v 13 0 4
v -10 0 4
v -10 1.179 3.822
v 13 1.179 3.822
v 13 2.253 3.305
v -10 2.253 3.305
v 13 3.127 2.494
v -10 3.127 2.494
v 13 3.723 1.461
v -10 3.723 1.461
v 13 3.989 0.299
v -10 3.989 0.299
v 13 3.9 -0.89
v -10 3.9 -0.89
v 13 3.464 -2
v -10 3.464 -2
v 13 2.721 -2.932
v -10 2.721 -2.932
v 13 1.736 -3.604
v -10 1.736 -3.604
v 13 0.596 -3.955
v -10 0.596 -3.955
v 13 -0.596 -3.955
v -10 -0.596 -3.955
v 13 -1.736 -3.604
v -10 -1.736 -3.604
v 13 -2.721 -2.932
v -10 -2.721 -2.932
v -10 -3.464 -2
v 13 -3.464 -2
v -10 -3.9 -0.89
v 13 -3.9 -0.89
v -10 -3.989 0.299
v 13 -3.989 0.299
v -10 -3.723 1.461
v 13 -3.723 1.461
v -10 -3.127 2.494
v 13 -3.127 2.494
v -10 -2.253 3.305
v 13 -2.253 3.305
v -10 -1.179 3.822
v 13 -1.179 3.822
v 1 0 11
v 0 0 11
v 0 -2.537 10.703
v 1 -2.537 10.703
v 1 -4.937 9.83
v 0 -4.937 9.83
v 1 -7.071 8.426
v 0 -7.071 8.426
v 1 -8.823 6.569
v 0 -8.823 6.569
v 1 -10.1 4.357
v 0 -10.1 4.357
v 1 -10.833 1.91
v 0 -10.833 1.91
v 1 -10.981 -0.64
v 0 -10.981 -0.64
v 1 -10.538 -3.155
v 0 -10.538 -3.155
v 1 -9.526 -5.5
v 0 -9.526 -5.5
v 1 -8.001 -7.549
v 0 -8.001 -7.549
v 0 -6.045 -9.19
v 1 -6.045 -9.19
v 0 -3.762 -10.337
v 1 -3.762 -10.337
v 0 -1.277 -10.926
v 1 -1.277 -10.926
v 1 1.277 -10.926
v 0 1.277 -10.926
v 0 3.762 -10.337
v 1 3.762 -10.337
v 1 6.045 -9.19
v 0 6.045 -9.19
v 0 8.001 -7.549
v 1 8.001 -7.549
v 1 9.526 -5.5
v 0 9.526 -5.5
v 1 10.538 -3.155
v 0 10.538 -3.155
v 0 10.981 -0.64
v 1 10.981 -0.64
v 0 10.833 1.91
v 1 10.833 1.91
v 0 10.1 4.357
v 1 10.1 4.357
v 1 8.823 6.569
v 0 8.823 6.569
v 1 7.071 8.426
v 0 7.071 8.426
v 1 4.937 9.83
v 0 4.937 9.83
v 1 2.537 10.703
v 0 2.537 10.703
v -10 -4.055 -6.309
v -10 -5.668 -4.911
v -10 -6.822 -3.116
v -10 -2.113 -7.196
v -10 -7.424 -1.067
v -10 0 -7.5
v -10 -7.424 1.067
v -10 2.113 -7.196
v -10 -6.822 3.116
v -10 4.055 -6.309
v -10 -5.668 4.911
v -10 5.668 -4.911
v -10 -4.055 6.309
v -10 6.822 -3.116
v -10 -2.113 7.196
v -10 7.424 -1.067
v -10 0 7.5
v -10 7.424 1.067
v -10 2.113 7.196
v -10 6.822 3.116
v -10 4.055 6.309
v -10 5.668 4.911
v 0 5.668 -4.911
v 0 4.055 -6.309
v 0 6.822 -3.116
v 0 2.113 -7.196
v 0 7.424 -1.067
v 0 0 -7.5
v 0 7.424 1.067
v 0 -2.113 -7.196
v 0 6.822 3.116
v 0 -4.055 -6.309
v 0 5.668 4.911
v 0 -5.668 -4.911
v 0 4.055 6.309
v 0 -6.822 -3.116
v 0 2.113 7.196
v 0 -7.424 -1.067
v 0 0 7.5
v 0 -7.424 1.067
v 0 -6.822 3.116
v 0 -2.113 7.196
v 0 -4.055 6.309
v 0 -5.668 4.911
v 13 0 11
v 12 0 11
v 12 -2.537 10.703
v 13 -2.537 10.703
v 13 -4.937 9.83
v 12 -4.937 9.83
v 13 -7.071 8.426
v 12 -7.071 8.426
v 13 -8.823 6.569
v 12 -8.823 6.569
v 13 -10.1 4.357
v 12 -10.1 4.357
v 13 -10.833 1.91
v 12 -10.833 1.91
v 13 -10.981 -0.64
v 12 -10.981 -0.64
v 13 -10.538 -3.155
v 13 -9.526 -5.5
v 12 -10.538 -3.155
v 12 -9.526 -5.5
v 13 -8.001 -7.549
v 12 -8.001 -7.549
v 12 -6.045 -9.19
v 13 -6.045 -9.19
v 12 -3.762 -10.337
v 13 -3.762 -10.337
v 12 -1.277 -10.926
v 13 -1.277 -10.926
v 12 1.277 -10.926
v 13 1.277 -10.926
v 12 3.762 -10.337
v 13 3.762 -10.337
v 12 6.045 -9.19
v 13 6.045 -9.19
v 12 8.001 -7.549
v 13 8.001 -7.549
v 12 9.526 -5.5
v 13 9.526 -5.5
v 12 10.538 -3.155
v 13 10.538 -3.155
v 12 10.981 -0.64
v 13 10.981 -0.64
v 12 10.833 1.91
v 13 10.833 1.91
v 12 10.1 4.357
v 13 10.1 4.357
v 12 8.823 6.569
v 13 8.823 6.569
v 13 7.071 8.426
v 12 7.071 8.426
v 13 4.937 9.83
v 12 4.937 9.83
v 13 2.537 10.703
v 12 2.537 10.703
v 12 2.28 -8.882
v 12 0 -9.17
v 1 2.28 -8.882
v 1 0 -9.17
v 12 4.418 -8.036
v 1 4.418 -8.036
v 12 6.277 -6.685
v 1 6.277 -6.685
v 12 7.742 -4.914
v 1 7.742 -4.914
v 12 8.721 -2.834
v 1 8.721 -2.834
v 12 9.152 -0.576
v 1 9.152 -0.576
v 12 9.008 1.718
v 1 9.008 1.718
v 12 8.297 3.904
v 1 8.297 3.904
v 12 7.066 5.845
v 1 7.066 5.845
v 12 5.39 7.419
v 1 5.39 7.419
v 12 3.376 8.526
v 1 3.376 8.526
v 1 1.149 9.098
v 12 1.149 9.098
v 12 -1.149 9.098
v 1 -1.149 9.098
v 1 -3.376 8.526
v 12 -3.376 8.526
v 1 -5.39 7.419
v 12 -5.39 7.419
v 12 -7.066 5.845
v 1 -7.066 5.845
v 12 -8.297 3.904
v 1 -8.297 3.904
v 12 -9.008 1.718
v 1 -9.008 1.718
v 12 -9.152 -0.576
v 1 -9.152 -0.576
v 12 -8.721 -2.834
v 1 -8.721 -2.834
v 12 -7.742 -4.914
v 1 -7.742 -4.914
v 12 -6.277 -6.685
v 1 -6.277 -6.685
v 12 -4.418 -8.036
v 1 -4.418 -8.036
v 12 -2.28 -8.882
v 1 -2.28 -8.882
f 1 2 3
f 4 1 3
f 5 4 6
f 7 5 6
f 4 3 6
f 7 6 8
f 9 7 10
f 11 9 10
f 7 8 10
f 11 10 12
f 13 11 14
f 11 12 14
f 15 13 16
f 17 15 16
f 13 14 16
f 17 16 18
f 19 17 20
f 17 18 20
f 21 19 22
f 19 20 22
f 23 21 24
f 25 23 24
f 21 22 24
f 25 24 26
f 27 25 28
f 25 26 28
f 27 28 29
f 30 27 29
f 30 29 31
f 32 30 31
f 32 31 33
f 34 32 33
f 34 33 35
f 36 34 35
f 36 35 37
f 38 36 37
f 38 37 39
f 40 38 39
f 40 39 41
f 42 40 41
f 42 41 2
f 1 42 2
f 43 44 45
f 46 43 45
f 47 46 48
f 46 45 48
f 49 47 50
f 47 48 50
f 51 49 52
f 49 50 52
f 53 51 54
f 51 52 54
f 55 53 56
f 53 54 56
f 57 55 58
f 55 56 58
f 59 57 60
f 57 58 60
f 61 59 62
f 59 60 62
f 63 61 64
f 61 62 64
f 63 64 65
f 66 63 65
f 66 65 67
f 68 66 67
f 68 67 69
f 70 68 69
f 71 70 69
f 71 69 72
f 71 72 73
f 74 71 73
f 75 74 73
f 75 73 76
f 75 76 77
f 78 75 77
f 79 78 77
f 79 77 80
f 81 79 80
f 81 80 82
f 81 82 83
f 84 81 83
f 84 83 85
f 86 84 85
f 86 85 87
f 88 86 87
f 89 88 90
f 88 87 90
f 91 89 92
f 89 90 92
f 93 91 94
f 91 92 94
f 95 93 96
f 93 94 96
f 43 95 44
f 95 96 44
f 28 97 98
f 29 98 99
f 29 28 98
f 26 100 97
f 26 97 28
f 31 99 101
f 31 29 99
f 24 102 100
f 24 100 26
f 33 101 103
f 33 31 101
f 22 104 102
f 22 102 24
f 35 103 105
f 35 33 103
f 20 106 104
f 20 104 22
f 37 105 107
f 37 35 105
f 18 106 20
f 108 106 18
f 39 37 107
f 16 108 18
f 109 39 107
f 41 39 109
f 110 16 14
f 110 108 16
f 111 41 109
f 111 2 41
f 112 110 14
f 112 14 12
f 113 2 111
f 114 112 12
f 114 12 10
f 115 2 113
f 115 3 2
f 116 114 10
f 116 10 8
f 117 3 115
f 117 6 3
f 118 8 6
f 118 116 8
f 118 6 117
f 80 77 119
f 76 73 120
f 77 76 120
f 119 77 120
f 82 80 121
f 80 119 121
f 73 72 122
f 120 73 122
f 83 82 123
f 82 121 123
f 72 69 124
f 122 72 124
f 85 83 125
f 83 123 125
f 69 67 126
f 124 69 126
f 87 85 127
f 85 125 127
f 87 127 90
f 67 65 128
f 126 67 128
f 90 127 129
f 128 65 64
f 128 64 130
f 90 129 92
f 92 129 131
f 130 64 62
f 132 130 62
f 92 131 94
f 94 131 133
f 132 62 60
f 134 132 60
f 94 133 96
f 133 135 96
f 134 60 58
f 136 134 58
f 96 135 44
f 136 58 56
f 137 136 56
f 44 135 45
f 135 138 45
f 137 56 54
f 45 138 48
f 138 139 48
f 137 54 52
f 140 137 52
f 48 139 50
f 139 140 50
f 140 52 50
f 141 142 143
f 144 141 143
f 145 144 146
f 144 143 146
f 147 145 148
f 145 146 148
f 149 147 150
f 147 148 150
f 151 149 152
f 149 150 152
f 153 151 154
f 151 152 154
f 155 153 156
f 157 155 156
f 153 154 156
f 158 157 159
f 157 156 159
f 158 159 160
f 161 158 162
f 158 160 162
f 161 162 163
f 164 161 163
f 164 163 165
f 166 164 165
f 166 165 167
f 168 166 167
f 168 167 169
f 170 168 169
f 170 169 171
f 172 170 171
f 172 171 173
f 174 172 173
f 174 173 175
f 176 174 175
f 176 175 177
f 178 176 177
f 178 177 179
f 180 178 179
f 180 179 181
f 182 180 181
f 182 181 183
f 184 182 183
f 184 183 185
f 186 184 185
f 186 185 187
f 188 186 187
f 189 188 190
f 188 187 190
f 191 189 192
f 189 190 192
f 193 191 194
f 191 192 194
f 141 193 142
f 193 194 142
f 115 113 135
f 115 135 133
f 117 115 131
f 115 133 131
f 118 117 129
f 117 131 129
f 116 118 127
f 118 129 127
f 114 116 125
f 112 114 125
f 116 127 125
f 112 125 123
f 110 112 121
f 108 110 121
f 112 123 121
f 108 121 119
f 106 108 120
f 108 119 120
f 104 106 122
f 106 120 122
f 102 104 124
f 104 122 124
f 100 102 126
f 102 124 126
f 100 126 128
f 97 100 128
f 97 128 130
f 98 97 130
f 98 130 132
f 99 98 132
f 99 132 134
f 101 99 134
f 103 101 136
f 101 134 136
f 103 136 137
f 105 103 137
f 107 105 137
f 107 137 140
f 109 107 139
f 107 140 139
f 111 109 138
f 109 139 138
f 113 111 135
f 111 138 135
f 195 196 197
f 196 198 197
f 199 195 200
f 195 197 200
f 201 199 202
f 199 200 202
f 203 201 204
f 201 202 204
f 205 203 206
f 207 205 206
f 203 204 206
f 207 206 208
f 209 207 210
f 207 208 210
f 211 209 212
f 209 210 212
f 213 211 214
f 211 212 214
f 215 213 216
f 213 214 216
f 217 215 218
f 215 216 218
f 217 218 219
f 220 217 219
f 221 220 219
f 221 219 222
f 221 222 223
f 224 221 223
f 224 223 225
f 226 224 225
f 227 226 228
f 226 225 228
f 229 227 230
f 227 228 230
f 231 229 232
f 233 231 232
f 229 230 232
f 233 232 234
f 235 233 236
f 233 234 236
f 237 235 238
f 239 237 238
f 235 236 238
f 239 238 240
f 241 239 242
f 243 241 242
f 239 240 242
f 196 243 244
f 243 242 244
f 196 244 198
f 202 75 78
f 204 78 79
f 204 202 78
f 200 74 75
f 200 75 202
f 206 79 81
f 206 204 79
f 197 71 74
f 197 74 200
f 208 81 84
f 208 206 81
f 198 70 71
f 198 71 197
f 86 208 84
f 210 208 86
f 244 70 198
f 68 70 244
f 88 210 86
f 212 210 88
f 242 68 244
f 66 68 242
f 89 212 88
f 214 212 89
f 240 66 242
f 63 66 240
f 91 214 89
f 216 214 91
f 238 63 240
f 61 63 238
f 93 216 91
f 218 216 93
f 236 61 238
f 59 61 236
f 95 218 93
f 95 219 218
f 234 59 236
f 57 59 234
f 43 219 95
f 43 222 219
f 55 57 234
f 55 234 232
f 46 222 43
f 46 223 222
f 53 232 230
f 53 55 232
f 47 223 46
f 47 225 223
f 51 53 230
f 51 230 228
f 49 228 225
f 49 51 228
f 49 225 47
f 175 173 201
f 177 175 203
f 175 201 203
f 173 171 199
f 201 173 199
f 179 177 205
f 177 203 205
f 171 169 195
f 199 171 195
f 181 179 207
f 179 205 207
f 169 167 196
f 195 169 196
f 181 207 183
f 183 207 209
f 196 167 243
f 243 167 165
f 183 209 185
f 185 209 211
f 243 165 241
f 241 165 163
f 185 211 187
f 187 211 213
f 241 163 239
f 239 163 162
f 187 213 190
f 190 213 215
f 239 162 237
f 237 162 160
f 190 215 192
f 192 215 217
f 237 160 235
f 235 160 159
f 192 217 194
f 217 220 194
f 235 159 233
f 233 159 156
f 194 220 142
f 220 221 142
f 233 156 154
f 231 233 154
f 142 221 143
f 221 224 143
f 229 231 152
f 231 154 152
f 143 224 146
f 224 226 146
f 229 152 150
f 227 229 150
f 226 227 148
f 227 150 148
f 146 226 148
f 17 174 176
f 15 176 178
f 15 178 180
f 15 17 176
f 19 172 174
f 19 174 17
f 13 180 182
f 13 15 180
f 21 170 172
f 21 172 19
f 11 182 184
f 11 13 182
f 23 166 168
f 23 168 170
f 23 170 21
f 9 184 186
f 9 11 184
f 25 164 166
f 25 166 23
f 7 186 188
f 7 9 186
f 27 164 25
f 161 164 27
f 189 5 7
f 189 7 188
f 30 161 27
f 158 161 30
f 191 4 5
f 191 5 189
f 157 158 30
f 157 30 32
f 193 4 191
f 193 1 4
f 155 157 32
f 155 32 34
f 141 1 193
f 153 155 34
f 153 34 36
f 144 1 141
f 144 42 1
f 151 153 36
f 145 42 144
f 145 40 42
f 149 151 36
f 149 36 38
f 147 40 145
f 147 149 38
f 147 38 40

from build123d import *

# Parameters (mm, degrees)
SKETCH_1_R          = 11
EXTRUDE_1_DEPTH     = 13
SKETCH_2_R          = 11
SKETCH_2_R_2        = 9.17
CUT_EXTRUDE_1_DEPTH = 5.5
SKETCH_3_R          = 7.5
EXTRUDE_2_DEPTH     = 10
CUT_EXTRUDE_2_REACH = 29.767
SKETCH_4_R          = 4


with BuildPart() as part:
    # 草图1 → 凸台-拉伸1 (new body)
    with BuildSketch(Plane(origin=(0, 0, 0), x_dir=(0, 0, -1), z_dir=(1, 0, 0))):
        with Locations(Location((0, 0, 0), (0, 0, 180))):
            Circle(SKETCH_1_R)
    extrude(amount=EXTRUDE_1_DEPTH)

    # 草图2 → 切除-拉伸1 (cut, symmetric)
    with BuildSketch(Plane(origin=(6.5, 0, 0), x_dir=(0, 0, -1), z_dir=(1, 0, 0))):
        with Locations(Location((0, 0, 0), (0, 0, 180))):
            Circle(SKETCH_2_R)
        Circle(SKETCH_2_R_2, mode=Mode.SUBTRACT)
    extrude(amount=CUT_EXTRUDE_1_DEPTH, both=True, mode=Mode.SUBTRACT)

    # 草图3 → 凸台-拉伸2 (add)
    with BuildSketch(Plane.ZY):
        Circle(SKETCH_3_R)
    extrude(amount=EXTRUDE_2_DEPTH)

    # 草图4 → 切除-拉伸2 (cut, up to next)
    with BuildSketch(Plane.ZY.offset(10), mode=Mode.PRIVATE) as cut_extrude_2_sk1:
        Circle(SKETCH_4_R)
    cut_extrude_2_tool1 = extrude(cut_extrude_2_sk1.sketch, amount=-CUT_EXTRUDE_2_REACH, mode=Mode.PRIVATE) & part.part
    add(cut_extrude_2_tool1.solids().sort_by_distance((-10, 0, 0))[0], mode=Mode.SUBTRACT)


solid = part.part
